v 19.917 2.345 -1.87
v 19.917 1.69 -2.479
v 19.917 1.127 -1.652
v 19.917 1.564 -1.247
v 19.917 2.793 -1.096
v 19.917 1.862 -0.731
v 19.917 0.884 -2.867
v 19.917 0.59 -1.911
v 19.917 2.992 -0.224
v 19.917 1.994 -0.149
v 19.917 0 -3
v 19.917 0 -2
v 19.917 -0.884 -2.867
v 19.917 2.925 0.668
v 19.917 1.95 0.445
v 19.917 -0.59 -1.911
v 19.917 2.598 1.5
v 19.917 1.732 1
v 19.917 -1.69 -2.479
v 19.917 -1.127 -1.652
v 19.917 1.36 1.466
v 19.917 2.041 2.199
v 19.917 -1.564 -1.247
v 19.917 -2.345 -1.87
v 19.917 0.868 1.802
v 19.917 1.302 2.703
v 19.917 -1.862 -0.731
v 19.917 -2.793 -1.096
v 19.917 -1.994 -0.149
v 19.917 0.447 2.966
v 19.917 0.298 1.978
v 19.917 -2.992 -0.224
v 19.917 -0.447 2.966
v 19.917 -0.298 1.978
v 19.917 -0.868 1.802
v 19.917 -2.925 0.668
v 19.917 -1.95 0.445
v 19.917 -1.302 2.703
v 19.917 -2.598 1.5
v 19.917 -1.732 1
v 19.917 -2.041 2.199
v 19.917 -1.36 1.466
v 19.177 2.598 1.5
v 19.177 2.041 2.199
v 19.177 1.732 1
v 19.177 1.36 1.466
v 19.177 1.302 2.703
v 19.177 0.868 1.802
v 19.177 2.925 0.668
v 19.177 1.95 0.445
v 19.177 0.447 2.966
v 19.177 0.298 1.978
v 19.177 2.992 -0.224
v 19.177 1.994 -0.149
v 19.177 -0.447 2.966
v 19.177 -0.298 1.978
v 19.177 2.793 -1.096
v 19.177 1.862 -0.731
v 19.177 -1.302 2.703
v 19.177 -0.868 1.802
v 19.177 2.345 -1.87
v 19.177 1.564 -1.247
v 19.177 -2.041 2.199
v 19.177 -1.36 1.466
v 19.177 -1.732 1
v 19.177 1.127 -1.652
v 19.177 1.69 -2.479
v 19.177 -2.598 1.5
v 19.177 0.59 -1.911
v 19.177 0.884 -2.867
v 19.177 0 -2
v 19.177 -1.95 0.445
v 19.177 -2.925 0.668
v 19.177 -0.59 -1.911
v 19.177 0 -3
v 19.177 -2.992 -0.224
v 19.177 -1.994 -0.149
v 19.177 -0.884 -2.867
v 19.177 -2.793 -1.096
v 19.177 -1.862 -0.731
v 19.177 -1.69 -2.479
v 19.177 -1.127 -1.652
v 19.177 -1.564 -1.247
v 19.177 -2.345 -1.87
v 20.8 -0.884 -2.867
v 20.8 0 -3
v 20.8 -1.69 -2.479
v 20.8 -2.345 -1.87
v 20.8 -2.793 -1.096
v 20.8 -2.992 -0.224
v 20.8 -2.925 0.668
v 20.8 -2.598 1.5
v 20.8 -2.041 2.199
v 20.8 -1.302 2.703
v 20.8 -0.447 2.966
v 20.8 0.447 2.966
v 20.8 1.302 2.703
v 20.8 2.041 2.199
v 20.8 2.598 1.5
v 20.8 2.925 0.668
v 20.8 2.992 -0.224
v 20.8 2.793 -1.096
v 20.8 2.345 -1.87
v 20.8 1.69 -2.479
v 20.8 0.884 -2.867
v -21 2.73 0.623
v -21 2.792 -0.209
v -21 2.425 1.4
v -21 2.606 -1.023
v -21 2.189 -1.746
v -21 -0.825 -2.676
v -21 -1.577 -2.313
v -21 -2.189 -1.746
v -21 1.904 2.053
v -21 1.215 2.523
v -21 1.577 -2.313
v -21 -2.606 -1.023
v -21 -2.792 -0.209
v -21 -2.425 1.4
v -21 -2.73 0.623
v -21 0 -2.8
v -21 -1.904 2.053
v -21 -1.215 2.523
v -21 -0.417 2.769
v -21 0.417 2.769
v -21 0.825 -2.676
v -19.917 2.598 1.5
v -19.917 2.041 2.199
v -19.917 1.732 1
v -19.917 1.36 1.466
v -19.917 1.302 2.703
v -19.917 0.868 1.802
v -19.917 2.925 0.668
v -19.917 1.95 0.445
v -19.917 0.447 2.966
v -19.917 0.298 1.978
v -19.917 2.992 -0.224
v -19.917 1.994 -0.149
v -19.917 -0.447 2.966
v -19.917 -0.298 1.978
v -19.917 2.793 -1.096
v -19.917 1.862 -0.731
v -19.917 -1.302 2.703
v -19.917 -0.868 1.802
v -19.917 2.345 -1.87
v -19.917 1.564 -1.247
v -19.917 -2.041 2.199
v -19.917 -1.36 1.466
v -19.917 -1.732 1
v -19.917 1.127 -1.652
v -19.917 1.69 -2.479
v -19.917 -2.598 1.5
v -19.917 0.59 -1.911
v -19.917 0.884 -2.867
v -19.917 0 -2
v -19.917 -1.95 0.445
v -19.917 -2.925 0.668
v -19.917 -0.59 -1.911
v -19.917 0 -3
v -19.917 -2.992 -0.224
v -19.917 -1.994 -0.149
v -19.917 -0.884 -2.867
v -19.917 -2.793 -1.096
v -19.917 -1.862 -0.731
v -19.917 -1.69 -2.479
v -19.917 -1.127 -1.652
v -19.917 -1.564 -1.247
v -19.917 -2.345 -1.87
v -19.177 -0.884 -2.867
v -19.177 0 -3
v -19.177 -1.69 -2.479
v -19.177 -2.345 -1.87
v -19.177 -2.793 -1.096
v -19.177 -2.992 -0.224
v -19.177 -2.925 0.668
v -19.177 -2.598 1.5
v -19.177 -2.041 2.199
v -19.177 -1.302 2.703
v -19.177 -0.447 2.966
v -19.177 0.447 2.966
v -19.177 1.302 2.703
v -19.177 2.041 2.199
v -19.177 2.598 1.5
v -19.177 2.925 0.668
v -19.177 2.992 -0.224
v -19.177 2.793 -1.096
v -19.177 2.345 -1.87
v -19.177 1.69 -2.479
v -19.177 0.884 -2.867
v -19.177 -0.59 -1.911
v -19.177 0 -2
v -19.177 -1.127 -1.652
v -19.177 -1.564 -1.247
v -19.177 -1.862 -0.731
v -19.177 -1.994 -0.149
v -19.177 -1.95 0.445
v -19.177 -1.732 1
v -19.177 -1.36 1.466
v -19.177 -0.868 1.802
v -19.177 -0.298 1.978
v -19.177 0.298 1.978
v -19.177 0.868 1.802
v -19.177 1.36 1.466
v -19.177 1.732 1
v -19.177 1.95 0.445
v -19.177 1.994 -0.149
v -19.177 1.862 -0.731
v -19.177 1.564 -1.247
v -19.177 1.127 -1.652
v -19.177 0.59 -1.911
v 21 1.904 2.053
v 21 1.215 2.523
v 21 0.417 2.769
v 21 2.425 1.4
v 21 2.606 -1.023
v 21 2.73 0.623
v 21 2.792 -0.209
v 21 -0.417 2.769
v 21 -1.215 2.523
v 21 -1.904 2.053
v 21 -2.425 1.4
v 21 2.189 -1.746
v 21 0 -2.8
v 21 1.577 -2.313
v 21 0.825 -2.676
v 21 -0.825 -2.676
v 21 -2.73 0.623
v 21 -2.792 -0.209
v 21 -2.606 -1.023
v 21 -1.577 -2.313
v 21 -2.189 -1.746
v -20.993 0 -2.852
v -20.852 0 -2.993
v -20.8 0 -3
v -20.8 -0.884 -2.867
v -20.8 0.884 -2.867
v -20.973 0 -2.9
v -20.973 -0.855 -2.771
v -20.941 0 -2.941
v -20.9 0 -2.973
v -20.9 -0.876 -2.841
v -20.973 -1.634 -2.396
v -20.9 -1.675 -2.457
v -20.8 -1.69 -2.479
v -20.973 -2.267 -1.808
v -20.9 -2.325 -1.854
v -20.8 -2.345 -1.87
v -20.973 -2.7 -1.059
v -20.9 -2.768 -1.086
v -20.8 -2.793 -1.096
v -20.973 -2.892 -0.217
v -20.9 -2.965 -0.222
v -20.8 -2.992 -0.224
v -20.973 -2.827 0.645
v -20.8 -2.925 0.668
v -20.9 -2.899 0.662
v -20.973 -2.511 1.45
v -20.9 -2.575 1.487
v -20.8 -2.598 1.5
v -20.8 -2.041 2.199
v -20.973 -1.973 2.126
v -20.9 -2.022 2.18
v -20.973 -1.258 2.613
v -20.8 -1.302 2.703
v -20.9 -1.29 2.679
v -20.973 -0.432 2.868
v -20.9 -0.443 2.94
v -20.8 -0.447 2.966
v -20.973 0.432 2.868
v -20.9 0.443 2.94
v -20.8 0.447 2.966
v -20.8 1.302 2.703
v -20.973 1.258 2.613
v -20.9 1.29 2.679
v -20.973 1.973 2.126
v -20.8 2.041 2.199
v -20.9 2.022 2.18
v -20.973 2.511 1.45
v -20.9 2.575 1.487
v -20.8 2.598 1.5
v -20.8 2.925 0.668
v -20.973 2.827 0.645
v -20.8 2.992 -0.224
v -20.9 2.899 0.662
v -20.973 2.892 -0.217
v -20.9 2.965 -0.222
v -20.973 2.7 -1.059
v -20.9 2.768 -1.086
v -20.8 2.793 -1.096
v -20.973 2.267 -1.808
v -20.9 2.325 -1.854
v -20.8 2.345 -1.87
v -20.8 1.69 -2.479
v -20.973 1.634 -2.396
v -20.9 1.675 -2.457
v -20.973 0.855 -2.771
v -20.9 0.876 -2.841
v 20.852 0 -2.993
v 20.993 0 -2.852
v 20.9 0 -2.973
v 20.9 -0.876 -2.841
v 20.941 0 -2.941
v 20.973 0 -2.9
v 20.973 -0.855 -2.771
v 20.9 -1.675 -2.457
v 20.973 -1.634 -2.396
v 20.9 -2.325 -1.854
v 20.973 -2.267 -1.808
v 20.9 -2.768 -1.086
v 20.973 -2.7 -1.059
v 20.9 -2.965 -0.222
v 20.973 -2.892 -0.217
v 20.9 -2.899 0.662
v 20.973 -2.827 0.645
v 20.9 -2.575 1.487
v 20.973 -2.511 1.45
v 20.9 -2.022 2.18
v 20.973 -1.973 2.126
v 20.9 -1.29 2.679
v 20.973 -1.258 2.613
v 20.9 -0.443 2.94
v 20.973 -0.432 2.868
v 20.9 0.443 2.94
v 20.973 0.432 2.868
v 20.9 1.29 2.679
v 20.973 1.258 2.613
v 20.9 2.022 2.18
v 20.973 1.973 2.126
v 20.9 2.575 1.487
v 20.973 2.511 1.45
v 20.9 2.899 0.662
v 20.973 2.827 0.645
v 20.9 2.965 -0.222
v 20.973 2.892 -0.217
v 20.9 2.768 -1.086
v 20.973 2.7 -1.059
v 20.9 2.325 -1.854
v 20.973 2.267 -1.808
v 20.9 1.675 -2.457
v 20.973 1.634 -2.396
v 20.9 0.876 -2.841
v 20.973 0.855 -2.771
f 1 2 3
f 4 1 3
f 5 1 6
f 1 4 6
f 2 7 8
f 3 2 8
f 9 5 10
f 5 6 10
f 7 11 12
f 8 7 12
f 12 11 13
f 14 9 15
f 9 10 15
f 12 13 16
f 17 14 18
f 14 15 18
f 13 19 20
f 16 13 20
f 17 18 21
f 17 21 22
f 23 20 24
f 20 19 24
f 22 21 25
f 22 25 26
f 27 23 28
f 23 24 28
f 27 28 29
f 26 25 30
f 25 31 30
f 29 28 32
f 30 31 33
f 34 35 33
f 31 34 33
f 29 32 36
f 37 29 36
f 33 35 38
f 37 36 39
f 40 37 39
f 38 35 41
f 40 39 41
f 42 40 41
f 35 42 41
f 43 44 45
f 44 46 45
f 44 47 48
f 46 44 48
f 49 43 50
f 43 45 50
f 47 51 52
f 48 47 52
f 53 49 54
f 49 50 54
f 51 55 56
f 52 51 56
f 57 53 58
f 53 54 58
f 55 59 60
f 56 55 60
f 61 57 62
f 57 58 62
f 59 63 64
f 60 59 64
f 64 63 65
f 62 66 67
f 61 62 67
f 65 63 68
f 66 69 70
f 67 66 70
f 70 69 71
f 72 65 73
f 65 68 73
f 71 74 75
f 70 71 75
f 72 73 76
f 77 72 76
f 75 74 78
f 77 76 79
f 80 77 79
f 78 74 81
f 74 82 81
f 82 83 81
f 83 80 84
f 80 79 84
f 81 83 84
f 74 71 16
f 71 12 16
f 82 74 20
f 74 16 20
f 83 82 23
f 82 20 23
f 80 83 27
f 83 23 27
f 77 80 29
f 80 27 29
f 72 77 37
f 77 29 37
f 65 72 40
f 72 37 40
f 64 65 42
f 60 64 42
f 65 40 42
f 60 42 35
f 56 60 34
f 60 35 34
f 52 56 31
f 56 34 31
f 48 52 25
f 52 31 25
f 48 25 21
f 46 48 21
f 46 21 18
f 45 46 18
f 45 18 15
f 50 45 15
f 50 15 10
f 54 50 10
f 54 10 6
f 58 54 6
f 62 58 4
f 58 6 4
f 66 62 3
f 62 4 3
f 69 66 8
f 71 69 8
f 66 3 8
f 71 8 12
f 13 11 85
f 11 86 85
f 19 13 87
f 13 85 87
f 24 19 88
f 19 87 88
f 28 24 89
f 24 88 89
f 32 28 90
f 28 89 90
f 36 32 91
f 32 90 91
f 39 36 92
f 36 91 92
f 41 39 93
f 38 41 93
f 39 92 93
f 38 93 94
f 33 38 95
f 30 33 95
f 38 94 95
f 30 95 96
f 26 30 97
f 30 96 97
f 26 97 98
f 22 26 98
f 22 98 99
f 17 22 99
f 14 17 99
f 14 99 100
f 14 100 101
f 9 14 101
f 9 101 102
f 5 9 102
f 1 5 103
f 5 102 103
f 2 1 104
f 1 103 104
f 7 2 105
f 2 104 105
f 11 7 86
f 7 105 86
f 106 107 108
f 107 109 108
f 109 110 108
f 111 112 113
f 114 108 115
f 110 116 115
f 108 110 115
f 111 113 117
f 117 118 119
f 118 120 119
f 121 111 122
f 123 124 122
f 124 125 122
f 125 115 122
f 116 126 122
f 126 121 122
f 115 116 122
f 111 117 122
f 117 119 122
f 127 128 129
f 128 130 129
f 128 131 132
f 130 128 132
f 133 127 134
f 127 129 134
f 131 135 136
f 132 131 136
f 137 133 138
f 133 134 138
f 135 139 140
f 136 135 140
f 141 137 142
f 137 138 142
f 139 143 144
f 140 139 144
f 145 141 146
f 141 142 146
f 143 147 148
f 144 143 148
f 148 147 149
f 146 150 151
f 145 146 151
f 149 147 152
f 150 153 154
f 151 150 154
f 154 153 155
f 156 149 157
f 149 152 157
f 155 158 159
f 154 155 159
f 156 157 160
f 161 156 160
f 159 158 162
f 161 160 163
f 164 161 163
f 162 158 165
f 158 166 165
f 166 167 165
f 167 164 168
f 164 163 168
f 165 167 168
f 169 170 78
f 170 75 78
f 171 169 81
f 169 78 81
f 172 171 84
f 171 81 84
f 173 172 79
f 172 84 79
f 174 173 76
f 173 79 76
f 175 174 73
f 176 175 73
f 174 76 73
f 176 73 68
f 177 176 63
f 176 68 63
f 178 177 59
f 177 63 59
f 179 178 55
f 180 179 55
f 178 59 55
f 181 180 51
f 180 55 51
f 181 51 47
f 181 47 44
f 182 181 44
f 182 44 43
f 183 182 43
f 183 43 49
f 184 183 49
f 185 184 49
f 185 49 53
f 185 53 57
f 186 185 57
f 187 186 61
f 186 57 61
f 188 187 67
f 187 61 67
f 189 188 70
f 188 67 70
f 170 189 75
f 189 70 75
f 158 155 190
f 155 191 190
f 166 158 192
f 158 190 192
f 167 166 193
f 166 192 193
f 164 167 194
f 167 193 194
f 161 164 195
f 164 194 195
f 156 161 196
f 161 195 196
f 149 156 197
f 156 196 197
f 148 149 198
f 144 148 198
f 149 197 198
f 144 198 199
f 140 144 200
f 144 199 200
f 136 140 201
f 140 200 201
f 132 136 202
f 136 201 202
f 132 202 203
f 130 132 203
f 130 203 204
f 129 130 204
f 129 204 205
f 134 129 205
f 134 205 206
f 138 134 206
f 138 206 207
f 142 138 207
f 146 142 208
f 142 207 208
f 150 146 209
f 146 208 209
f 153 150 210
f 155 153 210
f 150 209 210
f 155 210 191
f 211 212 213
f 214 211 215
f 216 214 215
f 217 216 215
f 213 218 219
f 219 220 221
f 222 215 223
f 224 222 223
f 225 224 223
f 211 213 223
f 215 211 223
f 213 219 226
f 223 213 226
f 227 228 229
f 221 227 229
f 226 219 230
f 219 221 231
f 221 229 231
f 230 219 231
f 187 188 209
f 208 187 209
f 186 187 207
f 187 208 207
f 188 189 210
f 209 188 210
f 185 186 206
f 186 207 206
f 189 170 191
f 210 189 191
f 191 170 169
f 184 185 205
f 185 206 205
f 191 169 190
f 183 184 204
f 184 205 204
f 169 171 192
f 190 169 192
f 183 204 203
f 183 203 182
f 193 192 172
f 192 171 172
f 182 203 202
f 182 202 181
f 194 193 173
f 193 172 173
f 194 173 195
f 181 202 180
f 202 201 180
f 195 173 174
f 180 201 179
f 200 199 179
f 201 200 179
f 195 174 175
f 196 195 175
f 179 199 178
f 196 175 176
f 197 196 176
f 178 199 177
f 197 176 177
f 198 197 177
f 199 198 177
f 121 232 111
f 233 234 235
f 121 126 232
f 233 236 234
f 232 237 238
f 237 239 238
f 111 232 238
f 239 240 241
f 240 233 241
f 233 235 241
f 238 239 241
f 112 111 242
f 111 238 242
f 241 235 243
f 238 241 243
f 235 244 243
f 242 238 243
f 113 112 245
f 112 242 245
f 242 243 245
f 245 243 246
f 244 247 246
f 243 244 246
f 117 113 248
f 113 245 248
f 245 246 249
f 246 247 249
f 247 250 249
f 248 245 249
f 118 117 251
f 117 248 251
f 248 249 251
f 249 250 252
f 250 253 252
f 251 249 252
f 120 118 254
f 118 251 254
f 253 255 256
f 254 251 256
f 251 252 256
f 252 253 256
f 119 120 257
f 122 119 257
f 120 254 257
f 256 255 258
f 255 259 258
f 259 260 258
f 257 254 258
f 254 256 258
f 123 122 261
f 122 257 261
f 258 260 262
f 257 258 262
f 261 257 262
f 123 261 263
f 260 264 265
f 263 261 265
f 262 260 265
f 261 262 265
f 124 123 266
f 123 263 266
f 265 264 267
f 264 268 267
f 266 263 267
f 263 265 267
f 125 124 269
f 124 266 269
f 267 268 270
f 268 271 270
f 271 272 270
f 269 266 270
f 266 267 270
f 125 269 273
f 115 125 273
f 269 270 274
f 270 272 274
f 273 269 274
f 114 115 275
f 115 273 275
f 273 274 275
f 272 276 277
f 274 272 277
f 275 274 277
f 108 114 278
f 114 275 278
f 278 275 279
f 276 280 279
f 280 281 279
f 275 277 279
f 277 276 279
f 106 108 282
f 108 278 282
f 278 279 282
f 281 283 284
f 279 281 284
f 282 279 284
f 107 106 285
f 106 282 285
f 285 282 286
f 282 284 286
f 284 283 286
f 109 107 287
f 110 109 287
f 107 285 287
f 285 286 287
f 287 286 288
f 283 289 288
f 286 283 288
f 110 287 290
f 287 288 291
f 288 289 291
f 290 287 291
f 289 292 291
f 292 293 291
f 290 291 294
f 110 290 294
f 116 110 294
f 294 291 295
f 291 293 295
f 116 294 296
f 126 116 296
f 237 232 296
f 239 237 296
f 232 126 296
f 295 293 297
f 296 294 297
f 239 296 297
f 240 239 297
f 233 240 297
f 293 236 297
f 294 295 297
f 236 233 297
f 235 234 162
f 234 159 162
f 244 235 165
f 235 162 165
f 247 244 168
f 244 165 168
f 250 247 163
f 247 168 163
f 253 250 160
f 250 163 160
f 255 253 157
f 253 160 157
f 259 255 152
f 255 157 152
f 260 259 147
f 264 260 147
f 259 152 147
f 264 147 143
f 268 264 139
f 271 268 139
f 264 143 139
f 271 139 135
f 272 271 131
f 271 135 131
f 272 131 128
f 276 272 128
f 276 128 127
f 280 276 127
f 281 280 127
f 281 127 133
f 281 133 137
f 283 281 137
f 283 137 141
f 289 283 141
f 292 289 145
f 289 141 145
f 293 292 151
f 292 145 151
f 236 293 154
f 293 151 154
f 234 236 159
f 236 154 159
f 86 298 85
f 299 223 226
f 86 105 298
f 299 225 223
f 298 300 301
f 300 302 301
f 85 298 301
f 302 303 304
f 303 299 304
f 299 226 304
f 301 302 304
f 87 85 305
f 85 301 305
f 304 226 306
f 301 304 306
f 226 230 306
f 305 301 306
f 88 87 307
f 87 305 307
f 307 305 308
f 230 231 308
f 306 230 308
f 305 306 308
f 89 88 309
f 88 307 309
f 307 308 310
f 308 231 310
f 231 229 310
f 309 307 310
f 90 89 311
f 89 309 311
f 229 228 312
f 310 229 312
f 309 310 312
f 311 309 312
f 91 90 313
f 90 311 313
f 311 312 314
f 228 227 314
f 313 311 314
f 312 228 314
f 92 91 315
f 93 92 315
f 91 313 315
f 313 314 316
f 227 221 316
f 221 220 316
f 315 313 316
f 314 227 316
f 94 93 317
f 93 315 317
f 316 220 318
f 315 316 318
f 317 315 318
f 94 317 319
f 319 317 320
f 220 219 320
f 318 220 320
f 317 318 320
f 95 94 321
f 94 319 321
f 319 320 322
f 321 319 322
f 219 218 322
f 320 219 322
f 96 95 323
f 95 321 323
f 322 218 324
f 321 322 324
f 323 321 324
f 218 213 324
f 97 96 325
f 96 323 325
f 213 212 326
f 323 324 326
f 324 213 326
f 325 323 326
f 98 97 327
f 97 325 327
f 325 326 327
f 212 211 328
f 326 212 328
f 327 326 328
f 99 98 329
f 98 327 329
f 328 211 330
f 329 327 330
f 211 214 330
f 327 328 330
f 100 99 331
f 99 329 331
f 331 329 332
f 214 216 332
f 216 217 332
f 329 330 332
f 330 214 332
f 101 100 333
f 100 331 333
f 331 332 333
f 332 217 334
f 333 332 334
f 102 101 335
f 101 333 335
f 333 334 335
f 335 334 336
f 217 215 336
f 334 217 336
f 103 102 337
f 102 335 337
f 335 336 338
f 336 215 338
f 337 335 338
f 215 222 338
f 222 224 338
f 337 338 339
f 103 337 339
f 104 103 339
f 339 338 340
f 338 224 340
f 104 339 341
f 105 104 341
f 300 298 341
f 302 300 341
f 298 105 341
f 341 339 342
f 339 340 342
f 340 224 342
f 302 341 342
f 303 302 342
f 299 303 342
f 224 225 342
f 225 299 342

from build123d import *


with BuildPart() as part:
    # Sketch1 → Revolve1 (revolve)
    with BuildSketch(Plane(origin=(0, 0, 0), x_dir=(1, 0, 0), z_dir=(0, 1, 0))):
        with BuildLine():
            Line((-19.177, 3), (19.177, 3))
            Line((19.177, 3), (19.177, 2))
            Line((19.177, 2), (19.917, 2))
            Line((19.917, 2), (19.917, 3))
            Line((19.917, 3), (20.8, 3))
            ThreePointArc((20.8, 3), (20.941421356, 2.941421356), (21, 2.8))
            Line((21, 2.8), (21, 0))
            Line((21, 0), (-21, 0))
            Line((-21, 0), (-21, 2.8))
            ThreePointArc((-21, 2.8), (-20.941421356, 2.941421356), (-20.8, 3))
            Line((-20.8, 3), (-19.917, 3))
            Line((-19.917, 3), (-19.917, 2))
            Line((-19.917, 2), (-19.177, 2))
            Line((-19.177, 2), (-19.177, 3))
        make_face()
    revolve(axis=Axis((21, 0, 0), (-1, 0, 0)))


solid = part.part
